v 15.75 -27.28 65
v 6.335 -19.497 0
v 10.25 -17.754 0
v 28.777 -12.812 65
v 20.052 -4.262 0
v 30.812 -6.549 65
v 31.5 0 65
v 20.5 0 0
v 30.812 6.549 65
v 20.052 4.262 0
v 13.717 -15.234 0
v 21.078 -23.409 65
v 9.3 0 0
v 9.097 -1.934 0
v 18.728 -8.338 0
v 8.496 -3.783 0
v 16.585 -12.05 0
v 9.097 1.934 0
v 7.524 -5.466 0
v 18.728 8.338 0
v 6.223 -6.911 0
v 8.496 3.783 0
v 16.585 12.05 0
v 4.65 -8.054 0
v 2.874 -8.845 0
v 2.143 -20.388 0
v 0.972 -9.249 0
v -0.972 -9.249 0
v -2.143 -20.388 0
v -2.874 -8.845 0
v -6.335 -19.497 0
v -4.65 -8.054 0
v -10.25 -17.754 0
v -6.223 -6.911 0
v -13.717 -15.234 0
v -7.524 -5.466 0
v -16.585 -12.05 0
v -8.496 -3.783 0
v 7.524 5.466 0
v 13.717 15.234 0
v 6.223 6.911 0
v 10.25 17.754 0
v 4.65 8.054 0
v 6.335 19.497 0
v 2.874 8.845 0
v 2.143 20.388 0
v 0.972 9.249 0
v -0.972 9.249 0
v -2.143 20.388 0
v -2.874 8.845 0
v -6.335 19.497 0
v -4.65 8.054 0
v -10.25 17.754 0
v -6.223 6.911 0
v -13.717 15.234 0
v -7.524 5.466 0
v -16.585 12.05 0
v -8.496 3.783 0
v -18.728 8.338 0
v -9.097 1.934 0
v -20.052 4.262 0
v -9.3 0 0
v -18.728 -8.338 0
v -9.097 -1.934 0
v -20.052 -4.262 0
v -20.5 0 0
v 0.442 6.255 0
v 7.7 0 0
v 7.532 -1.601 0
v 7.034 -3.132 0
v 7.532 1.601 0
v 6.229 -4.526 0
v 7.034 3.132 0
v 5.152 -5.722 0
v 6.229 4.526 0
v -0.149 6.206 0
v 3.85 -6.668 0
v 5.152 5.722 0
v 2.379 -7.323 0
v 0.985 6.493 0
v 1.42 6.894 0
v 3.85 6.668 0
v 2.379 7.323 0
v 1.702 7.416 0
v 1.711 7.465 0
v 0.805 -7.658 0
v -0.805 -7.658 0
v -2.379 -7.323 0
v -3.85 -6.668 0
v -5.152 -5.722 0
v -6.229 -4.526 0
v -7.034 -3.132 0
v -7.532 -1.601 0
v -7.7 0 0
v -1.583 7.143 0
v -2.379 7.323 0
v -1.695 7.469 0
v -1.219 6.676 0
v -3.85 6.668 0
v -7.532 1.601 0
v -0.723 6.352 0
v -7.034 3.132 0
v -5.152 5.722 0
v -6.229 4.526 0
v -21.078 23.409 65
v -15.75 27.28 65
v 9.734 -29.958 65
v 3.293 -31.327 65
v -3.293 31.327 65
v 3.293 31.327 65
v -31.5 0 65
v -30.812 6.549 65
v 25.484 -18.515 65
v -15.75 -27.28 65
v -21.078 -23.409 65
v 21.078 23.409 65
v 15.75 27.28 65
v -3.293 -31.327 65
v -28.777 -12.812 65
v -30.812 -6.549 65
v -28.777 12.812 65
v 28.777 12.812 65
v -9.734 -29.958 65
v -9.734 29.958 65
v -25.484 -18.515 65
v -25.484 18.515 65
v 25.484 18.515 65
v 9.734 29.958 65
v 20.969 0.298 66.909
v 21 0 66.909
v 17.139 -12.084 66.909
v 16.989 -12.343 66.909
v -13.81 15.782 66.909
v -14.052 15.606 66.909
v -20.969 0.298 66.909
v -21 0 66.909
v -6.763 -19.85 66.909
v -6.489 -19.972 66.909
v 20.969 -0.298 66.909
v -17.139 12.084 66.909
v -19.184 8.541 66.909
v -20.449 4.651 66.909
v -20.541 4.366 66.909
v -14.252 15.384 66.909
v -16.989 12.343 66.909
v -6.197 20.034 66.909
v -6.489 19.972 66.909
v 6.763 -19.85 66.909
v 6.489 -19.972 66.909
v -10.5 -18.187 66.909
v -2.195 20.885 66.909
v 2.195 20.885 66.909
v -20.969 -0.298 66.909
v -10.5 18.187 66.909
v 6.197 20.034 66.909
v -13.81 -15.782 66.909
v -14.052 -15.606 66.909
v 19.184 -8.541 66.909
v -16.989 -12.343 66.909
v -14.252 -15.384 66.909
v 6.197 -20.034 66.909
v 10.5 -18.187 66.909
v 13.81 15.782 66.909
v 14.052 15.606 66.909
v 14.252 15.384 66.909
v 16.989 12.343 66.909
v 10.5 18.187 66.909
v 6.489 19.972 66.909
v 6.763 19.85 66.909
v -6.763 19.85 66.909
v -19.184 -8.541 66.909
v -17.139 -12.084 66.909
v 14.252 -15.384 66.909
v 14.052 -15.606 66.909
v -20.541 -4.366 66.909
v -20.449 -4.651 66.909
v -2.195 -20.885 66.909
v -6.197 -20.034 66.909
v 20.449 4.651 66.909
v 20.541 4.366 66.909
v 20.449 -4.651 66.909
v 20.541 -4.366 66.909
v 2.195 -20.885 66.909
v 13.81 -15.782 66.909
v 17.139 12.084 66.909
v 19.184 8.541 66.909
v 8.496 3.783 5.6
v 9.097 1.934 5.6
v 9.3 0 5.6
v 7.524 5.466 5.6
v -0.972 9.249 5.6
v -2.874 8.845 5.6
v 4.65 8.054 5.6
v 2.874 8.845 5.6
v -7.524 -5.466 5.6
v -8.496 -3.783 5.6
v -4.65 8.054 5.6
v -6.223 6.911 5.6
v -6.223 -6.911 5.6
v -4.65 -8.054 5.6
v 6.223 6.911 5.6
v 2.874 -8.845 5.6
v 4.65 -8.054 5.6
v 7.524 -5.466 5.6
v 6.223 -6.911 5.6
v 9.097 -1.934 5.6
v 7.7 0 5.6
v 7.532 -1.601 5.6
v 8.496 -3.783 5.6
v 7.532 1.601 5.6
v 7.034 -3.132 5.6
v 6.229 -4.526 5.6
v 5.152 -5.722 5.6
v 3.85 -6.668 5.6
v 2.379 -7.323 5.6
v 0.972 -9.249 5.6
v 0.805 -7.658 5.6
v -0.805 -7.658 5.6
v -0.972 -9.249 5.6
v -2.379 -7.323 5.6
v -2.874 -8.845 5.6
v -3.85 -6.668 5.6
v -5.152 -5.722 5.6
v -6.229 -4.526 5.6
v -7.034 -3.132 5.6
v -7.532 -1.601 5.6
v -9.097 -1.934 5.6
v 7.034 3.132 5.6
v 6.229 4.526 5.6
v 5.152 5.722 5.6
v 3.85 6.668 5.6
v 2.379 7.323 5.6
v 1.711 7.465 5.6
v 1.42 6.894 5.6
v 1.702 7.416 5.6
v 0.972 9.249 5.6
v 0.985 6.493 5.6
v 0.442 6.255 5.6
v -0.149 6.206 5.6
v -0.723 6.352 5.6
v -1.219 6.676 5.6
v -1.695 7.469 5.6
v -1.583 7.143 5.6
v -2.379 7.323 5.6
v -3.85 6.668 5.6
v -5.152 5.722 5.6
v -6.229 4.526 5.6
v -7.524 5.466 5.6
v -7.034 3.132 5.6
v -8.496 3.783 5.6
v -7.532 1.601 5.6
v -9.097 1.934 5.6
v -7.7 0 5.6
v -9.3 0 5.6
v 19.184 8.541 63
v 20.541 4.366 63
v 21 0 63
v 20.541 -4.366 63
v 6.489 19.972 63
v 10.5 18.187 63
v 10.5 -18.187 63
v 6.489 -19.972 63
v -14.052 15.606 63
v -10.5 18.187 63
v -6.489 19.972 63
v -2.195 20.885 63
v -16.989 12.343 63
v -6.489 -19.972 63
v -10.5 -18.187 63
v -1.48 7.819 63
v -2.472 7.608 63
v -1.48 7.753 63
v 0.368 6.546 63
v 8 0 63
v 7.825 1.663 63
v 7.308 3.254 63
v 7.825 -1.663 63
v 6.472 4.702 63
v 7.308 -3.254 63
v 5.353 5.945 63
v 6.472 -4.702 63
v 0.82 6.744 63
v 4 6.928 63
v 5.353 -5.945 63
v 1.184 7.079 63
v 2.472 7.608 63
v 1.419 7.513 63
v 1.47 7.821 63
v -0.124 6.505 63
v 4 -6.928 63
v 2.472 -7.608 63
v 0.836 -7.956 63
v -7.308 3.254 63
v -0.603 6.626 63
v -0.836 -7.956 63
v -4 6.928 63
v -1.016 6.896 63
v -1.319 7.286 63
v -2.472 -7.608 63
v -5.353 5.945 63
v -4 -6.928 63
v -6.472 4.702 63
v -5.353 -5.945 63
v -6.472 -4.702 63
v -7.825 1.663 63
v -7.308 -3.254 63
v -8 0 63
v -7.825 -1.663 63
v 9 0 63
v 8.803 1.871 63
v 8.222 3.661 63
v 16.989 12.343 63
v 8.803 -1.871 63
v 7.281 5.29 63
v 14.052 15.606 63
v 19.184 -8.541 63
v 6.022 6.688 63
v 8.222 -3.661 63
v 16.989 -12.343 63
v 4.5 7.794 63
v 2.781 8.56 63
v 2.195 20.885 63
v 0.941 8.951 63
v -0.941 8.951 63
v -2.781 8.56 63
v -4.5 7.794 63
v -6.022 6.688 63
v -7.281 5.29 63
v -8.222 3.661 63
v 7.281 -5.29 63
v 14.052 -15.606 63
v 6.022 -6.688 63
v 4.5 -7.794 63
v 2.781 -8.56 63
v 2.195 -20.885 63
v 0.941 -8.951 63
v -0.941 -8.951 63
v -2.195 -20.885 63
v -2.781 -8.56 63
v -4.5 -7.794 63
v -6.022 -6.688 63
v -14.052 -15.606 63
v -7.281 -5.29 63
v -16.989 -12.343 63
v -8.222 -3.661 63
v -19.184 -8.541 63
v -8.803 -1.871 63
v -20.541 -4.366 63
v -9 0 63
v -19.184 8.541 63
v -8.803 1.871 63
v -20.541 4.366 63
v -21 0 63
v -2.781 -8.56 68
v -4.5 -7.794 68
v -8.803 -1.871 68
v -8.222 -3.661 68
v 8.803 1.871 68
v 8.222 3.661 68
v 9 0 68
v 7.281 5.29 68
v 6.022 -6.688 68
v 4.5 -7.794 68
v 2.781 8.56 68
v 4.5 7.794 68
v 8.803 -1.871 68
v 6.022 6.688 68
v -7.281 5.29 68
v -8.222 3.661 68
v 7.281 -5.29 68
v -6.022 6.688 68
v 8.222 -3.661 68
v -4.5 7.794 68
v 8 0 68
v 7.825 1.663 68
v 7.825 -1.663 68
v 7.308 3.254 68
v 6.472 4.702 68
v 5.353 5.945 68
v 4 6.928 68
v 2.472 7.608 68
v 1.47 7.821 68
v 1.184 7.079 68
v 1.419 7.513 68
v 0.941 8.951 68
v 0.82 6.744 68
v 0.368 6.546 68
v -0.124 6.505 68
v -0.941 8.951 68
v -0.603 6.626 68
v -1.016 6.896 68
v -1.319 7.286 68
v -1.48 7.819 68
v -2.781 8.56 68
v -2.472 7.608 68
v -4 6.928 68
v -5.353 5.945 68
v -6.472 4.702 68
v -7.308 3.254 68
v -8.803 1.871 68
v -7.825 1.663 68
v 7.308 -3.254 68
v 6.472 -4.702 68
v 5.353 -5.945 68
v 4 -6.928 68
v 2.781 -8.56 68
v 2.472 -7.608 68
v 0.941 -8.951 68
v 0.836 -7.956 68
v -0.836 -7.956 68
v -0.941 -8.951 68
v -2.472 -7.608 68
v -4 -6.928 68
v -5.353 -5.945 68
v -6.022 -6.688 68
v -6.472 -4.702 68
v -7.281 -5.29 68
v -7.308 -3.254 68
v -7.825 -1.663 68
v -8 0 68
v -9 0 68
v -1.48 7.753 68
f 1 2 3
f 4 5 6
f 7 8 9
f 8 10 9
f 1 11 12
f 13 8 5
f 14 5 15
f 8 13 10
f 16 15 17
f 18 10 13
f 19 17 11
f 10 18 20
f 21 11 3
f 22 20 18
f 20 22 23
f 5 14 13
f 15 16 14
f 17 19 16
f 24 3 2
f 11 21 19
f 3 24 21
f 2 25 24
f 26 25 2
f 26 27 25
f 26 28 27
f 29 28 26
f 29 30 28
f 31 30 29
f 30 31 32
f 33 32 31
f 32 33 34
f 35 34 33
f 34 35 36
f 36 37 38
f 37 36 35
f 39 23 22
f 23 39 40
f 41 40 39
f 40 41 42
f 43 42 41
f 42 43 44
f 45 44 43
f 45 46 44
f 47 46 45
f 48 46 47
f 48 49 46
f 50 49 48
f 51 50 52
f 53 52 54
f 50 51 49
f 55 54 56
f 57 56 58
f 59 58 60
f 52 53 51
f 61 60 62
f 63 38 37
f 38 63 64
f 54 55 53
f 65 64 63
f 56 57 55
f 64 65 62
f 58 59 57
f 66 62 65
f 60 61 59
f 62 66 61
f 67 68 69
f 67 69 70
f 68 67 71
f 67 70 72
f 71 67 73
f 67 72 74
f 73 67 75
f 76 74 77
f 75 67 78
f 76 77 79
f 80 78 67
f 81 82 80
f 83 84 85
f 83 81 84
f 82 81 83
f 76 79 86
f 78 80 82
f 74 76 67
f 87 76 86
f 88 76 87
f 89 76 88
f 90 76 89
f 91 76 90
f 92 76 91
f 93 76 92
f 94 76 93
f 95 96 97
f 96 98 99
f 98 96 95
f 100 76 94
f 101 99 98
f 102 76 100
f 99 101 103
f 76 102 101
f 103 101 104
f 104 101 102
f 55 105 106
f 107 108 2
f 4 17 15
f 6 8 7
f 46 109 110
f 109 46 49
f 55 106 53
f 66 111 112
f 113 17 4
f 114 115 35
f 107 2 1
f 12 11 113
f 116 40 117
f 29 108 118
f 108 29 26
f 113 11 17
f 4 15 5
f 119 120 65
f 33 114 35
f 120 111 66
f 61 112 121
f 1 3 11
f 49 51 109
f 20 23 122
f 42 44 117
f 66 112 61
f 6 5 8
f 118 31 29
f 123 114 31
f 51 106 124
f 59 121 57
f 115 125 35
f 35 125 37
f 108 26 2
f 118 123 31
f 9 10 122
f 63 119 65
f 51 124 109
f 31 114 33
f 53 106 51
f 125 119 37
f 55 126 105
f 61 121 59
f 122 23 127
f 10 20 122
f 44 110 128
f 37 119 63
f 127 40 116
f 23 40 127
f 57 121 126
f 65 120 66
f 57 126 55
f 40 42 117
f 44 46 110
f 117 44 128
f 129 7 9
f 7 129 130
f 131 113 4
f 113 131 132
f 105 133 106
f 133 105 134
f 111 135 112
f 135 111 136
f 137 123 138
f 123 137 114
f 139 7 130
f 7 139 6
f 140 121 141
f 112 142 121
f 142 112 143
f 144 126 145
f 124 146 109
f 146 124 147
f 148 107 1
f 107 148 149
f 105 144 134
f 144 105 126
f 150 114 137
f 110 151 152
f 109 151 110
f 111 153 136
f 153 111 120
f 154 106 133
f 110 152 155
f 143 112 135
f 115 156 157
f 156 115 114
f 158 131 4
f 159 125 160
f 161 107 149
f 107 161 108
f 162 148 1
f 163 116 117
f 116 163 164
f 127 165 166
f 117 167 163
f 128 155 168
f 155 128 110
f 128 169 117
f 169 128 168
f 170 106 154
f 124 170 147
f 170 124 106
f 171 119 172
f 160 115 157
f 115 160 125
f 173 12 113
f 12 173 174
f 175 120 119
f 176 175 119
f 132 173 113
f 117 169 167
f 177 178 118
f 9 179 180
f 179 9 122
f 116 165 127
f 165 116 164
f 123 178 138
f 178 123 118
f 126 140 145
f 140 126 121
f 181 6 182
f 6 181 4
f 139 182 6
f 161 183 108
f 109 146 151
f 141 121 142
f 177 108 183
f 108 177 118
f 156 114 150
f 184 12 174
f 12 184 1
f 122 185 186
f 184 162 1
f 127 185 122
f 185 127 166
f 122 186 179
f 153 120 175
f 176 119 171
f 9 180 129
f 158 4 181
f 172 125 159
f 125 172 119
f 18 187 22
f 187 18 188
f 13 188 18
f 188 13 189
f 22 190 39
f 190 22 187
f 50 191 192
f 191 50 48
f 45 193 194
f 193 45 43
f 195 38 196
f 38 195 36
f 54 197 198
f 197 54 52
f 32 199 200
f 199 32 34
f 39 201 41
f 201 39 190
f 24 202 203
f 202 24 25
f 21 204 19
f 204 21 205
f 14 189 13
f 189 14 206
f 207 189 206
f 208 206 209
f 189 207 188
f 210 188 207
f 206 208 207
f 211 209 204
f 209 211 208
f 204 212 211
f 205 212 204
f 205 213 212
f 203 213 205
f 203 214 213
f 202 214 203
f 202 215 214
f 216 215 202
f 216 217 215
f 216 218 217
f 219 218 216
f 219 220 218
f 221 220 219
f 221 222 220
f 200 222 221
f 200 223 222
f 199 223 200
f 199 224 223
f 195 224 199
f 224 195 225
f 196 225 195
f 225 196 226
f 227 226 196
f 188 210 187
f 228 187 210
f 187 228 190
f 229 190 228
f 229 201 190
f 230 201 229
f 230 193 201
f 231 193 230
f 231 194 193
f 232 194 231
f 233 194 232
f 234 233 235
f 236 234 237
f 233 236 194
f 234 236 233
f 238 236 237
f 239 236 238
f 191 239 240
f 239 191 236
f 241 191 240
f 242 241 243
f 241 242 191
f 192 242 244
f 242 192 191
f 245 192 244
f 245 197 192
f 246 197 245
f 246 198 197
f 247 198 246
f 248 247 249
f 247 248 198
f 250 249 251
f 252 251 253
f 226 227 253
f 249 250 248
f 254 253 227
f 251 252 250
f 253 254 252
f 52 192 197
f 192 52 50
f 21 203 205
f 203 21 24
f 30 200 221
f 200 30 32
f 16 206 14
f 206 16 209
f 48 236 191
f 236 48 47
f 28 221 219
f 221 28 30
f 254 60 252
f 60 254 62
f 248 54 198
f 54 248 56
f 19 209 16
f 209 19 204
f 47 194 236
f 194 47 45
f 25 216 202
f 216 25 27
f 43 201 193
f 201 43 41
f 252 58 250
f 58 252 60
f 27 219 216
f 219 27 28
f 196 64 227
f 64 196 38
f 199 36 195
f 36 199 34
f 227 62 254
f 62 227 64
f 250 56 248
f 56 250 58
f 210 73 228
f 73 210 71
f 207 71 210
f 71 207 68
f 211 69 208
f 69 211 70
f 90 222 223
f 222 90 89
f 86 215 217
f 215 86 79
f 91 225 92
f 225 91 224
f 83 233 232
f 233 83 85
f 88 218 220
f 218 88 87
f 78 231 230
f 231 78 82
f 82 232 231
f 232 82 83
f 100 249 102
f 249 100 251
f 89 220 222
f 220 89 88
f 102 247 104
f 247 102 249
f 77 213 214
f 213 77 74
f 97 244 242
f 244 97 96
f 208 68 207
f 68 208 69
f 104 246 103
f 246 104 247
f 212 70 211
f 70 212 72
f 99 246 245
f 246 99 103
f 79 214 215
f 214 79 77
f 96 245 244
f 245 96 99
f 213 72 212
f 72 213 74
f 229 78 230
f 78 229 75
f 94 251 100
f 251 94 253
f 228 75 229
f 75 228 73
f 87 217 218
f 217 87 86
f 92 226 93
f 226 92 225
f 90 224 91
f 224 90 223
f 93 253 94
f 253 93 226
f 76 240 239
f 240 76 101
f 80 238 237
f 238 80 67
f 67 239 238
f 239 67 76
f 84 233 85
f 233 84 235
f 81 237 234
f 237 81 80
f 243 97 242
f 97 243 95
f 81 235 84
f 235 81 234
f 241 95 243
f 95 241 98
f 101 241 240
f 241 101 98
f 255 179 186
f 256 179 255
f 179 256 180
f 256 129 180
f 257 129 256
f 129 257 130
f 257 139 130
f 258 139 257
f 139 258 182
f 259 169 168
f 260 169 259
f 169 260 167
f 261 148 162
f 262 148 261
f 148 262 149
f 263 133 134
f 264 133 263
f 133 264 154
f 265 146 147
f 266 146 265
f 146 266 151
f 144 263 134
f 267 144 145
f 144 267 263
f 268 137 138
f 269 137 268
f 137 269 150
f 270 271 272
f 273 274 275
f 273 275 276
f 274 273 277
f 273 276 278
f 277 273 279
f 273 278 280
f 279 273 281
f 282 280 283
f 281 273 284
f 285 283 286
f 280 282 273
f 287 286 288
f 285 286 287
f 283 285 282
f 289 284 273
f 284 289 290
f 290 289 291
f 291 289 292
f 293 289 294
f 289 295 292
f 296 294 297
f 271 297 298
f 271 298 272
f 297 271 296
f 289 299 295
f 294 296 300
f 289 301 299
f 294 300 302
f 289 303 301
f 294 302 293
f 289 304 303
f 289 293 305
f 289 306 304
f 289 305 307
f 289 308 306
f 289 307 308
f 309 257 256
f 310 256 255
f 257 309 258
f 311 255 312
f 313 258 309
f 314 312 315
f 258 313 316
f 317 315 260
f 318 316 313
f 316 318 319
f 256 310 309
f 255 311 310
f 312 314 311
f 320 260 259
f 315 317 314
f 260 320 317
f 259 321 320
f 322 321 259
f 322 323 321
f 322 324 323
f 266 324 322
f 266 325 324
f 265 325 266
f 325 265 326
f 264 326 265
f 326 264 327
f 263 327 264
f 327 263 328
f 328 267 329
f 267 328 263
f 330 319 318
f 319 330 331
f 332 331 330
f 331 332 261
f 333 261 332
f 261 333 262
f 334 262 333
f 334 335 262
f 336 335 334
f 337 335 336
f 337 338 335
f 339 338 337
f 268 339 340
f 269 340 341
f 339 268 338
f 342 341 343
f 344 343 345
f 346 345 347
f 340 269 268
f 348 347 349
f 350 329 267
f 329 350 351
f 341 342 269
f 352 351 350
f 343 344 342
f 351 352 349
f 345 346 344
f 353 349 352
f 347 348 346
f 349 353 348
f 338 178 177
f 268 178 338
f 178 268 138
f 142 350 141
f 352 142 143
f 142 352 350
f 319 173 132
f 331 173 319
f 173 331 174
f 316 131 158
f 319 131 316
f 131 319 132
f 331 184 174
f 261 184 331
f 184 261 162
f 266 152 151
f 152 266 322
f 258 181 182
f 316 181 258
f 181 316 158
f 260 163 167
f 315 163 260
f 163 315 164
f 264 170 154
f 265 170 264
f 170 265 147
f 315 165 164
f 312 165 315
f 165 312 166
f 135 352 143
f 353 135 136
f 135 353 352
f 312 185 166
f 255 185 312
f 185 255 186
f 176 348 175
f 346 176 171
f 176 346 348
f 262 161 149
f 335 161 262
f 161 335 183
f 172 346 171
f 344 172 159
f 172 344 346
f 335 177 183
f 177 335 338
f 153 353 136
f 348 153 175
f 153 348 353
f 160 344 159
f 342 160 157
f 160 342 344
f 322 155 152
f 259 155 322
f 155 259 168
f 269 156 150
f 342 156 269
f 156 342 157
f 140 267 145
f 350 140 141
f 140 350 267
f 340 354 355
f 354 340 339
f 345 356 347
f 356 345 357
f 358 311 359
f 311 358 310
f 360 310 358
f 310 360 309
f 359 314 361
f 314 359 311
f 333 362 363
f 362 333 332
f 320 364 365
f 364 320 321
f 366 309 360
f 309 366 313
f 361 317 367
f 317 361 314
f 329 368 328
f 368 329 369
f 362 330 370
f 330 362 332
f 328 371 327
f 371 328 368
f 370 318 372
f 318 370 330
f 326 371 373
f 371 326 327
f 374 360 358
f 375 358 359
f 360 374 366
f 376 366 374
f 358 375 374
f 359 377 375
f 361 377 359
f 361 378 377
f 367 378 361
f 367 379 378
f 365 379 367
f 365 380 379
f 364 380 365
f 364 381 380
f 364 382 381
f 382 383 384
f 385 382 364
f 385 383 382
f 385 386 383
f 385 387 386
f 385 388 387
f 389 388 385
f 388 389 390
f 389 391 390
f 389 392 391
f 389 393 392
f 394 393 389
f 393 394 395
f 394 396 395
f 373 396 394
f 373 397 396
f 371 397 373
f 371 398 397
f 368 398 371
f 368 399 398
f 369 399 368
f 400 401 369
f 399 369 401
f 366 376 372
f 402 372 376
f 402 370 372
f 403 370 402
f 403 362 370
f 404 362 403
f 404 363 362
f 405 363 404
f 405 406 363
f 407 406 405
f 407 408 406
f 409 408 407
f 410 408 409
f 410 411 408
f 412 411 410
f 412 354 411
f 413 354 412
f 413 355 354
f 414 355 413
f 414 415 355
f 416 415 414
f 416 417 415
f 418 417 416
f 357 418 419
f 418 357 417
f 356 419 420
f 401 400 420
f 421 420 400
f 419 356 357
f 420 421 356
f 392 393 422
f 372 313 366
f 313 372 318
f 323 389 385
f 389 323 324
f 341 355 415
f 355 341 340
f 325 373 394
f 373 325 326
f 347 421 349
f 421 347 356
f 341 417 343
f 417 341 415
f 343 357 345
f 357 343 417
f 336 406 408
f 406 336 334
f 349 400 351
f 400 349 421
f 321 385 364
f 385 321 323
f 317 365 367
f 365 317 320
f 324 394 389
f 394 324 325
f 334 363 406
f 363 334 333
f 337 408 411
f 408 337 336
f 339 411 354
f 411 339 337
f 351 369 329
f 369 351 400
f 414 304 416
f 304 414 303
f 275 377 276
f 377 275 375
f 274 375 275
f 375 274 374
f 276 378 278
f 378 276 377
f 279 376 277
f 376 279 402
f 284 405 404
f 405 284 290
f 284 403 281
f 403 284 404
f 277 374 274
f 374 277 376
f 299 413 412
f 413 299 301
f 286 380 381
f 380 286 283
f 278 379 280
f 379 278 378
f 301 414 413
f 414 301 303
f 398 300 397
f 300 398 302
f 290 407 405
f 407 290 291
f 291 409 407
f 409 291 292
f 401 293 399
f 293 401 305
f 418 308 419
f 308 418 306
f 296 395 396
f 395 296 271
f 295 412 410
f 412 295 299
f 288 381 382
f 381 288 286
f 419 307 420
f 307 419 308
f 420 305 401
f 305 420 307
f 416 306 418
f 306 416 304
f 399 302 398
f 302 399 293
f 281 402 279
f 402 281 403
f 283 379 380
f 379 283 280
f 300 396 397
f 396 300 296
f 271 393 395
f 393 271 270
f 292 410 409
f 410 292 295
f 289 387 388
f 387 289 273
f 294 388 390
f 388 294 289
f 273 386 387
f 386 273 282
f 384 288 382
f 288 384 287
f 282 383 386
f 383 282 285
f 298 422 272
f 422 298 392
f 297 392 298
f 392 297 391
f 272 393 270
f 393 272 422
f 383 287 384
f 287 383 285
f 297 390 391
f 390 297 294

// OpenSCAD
// file: ../../connectors/notched_circle/constants.scad
connectors_notched_circle_thickness = 2;
connectors_notched_circle_notch_diameter = 3;
connectors_notched_circle_loose_length = 1;
connectors_notched_circle_loose_to_tight_length = 1;
// file: ../../connectors/notched_circle/female.scad
include <../../settings.scad>;
use <../../utilities/cylinders.scad>;
include <constants.scad>;

// Renders the female counterpart of a circular connector with an orienting
// notch.  Place on the surface oriented so that Z- is the surface normal.
module connectors_notched_circle_female(
    // The outer diameter of the compatible male circle.
    diameter,
    // The length of the male compatible circle.
    length
) {
  union() {
    difference() {
      cylinder(
        d = diameter + tight_tolerance,
        h = length + tight_tolerance,
        $fn = cylinder_sides(diameter)
      );
      cylinder(
        d = diameter - connectors_notched_circle_thickness - tight_tolerance,
        h = length + tight_tolerance,
        $fn = cylinder_sides(diameter)
      );
    };
    intersection() {
      translate([
        0,
        diameter / 2 - connectors_notched_circle_thickness / 2,
        0
      ]) {
        cylinder(
          d = connectors_notched_circle_notch_diameter + tight_tolerance,
          h = length + tight_tolerance,
          $fn = cylinder_sides(connectors_notched_circle_notch_diameter)
        );
      };
      cylinder(
        d = diameter + tight_tolerance,
        h = length + tight_tolerance,
        $fn = cylinder_sides(diameter)
      );
    };
  };
};

difference() {
  cube([10, 10, 7]);

  translate([5, 5, 7.001]) {
    rotate([180, 0, 0]) {
      connectors_notched_circle_female(6, 5);
    }
  };
};
// file: ../../connectors/notched_circle/male.scad
include <../../settings.scad>;
use <../../utilities/cylinders.scad>;
include <constants.scad>;

// Renders the male counterpart of a circular connector with an orienting notch.
// Place on the surface oriented so that Z+ is the surface normal.
module connectors_notched_circle_male(
    // The outer diameter of the male circle.
    diameter,
    // The length of the male circle.
    length
) {
  union() {
    difference() {
      cylinder(
        d = diameter,
        h = length,
        $fn = cylinder_sides(diameter)
      );
      cylinder(
        d = diameter - connectors_notched_circle_thickness,
        h = length,
        $fn = cylinder_sides(diameter)
      );
    };
    intersection() {
      translate([
        0,
        diameter / 2 - connectors_notched_circle_thickness / 2,
        0
      ]) {
        cylinder(
          d = connectors_notched_circle_notch_diameter,
          h = length,
          $fn = cylinder_sides(connectors_notched_circle_notch_diameter)
        );
      };
      cylinder(
        d = diameter,
        h = length,
        $fn = cylinder_sides(diameter)
      );
    };
  };
};
// file: ../muzzle/measurements.scad
hero_dualie_muzzle_hole_diameter = 5;
hero_dualie_muzzle_hole_depth = 6;
hero_dualie_muzzle_end_diameter = 34;
hero_dualie_muzzle_start_diameter = 41;
hero_dualie_muzzle_length = 2;
hero_dualie_muzzle_connector_diameter = 18;
hero_dualie_muzzle_connector_length = 5;
// file: ../barrel/measurements.scad
hero_dualie_barrel_length = 26;
hero_dualie_barrel_diameter = 22;
hero_dualie_barrel_connector_diameter = 18;
hero_dualie_barrel_connector_length = 5;
hero_dualie_barrel_connector_notches = 3;
hero_dualie_barrel_wall_thickness = 1;
hero_dualie_barrel_floor_ceiling_thickness = 2.5;
hero_dualie_barrel_led_hole_diameter = 5 + loose_tolerance * 2;
hero_dualie_barrel_led_rail_diameter = 1;
// file: measurements.scad
hero_dualie_muffler_start_diameter = 41;
hero_dualie_muffler_end_diameter = 63;
hero_dualie_muffler_body_length = 65;
hero_dualie_muffler_transition_to_muzzle_length = 2;
hero_dualie_muffler_thickness = 2;
// file: ../../utilities/cylinders.scad
// Calculates the $fn which should be used for a cylinder of a specific size.
function cylinder_sides(
  // The diameter of the cylinder.
  diameter
) = ceil(
  max(
    min(
      360 / $fa,
      diameter * PI / $fs
    ),
    8
  )
);

// Generates a grid of square perforations through a cylinder of a specific
// size.
module cylinder_perforations(
  // The diameter of the cylinder.
  diameter,
  // The height of the cylinder.
  length,
  // The size (width/height) of each perforation.
  perforation_size,
  // The target spacing between perforations.  This will be adjusted to fit
  // evenly on the cylinder.
  perforation_spacing
) {
  half_perimeter = diameter * PI / 2;
  angularPerforations = round(half_perimeter / perforation_spacing);
  zPerforations = round(length / perforation_spacing);
  for (angle = [0:180 / angularPerforations:180]) {
    rotate([0, 0, angle]) {
      for (z = [(length / zPerforations) * 0.5:length / zPerforations:length - (length / zPerforations) * 0.5]) {
        translate([0, 0, z]) {
          cube([diameter, perforation_size, perforation_size], center = true);
        };
      }
    };
  };
};

// Generates a "pipe" which lofts a sequence of circles together.
module cylinder_sequence(
  // The diameter of the first circle.
  initial_diameter,
  // An array of arrays, where each child array is two numbers:
  // - The length of the segment along Z.
  // - The diameter of the end of the segment.
  length_diameter_pairs,
  // The number of sides of all circles drawn.
  sides,
  // Used for recursion; leave as default.
  i = 0
) {
  if (i < len(length_diameter_pairs)) {
    cylinder(
      d1 = initial_diameter,
      d2 = length_diameter_pairs[i][1],
      h = length_diameter_pairs[i][0],
      $fn = sides
    );
    translate([
      0,
      0,
      length_diameter_pairs[i][0]
    ]) {
      cylinder_sequence(
        length_diameter_pairs[i][1],
        length_diameter_pairs,
        sides,
        i + 1
      );
    };
  };
};
// file: ../../utilities/math.scad
function linear_interpolate(
  from,
  to,
  mix
) = from + (to - from) * mix;

function remap(
  value,
  fromLow,
  fromHigh,
  toLow,
  toHigh
) = linear_interpolate(toLow, toHigh, (value - fromLow) / (fromHigh - fromLow));
// file: shape.scad
include <../../settings.scad>;
use <../../utilities/math.scad>;
use <../../utilities/cylinders.scad>;
include <measurements.scad>;
include <../barrel/measurements.scad>;
include <../muzzle/measurements.scad>;
use <../../connectors/notched_circle/male.scad>;
use <../../connectors/notched_circle/female.scad>;

module hero_dualie_muffler_shape() {
  bottom_of_muzzle_recess = hero_dualie_muffler_body_length - hero_dualie_muffler_transition_to_muzzle_length;

  difference() {
    // The body.
    cylinder_sequence(
      hero_dualie_muffler_start_diameter,
      [
        [
          hero_dualie_muffler_body_length,
          hero_dualie_muffler_end_diameter
        ],
        [
          hero_dualie_muffler_transition_to_muzzle_length,
          hero_dualie_muzzle_start_diameter
        ]
      ],
      cylinder_sides(hero_dualie_muzzle_end_diameter)
    );

    // The connector to the barrel.
    connectors_notched_circle_female(
      hero_dualie_barrel_connector_diameter,
      hero_dualie_barrel_connector_length
    );

    // The recess for the muzzle.
    translate([
      0,
      0,
      bottom_of_muzzle_recess
    ]) {
      cylinder(
        d = hero_dualie_muzzle_start_diameter + loose_tolerance,
        h = hero_dualie_muzzle_connector_length,
        $fn = cylinder_sides(hero_dualie_muzzle_start_diameter)
      );
    };
  };

  // The connector to the muzzle.
  translate([
    0,
    0,
    bottom_of_muzzle_recess
  ]) {
    connectors_notched_circle_male(
      hero_dualie_muzzle_connector_diameter,
      hero_dualie_muzzle_connector_length
    );
  };
};
// file: ../../settings.scad
// When true, lower resolution primitives will be used.
draft = false;

$fs = draft ? 1 : 0.5;

// The amount of space left between parts which must fit together tightly.
tight_tolerance = 0.6;

// The amount of space left between parts which must fit together loosely.
loose_tolerance = 1;

// Calculates the $fn which should be used for a cylinder of a specific size.
function cylinder_sides(
  // The diameter of the cylinder.
  diameter
) = ceil(
  max(
    min(
      360 / $fa,
      diameter * PI / $fs
    ),
    8
  )
);
// main file
include <../../settings.scad>;
use <shape.scad>;

hero_dualie_muffler_shape();
